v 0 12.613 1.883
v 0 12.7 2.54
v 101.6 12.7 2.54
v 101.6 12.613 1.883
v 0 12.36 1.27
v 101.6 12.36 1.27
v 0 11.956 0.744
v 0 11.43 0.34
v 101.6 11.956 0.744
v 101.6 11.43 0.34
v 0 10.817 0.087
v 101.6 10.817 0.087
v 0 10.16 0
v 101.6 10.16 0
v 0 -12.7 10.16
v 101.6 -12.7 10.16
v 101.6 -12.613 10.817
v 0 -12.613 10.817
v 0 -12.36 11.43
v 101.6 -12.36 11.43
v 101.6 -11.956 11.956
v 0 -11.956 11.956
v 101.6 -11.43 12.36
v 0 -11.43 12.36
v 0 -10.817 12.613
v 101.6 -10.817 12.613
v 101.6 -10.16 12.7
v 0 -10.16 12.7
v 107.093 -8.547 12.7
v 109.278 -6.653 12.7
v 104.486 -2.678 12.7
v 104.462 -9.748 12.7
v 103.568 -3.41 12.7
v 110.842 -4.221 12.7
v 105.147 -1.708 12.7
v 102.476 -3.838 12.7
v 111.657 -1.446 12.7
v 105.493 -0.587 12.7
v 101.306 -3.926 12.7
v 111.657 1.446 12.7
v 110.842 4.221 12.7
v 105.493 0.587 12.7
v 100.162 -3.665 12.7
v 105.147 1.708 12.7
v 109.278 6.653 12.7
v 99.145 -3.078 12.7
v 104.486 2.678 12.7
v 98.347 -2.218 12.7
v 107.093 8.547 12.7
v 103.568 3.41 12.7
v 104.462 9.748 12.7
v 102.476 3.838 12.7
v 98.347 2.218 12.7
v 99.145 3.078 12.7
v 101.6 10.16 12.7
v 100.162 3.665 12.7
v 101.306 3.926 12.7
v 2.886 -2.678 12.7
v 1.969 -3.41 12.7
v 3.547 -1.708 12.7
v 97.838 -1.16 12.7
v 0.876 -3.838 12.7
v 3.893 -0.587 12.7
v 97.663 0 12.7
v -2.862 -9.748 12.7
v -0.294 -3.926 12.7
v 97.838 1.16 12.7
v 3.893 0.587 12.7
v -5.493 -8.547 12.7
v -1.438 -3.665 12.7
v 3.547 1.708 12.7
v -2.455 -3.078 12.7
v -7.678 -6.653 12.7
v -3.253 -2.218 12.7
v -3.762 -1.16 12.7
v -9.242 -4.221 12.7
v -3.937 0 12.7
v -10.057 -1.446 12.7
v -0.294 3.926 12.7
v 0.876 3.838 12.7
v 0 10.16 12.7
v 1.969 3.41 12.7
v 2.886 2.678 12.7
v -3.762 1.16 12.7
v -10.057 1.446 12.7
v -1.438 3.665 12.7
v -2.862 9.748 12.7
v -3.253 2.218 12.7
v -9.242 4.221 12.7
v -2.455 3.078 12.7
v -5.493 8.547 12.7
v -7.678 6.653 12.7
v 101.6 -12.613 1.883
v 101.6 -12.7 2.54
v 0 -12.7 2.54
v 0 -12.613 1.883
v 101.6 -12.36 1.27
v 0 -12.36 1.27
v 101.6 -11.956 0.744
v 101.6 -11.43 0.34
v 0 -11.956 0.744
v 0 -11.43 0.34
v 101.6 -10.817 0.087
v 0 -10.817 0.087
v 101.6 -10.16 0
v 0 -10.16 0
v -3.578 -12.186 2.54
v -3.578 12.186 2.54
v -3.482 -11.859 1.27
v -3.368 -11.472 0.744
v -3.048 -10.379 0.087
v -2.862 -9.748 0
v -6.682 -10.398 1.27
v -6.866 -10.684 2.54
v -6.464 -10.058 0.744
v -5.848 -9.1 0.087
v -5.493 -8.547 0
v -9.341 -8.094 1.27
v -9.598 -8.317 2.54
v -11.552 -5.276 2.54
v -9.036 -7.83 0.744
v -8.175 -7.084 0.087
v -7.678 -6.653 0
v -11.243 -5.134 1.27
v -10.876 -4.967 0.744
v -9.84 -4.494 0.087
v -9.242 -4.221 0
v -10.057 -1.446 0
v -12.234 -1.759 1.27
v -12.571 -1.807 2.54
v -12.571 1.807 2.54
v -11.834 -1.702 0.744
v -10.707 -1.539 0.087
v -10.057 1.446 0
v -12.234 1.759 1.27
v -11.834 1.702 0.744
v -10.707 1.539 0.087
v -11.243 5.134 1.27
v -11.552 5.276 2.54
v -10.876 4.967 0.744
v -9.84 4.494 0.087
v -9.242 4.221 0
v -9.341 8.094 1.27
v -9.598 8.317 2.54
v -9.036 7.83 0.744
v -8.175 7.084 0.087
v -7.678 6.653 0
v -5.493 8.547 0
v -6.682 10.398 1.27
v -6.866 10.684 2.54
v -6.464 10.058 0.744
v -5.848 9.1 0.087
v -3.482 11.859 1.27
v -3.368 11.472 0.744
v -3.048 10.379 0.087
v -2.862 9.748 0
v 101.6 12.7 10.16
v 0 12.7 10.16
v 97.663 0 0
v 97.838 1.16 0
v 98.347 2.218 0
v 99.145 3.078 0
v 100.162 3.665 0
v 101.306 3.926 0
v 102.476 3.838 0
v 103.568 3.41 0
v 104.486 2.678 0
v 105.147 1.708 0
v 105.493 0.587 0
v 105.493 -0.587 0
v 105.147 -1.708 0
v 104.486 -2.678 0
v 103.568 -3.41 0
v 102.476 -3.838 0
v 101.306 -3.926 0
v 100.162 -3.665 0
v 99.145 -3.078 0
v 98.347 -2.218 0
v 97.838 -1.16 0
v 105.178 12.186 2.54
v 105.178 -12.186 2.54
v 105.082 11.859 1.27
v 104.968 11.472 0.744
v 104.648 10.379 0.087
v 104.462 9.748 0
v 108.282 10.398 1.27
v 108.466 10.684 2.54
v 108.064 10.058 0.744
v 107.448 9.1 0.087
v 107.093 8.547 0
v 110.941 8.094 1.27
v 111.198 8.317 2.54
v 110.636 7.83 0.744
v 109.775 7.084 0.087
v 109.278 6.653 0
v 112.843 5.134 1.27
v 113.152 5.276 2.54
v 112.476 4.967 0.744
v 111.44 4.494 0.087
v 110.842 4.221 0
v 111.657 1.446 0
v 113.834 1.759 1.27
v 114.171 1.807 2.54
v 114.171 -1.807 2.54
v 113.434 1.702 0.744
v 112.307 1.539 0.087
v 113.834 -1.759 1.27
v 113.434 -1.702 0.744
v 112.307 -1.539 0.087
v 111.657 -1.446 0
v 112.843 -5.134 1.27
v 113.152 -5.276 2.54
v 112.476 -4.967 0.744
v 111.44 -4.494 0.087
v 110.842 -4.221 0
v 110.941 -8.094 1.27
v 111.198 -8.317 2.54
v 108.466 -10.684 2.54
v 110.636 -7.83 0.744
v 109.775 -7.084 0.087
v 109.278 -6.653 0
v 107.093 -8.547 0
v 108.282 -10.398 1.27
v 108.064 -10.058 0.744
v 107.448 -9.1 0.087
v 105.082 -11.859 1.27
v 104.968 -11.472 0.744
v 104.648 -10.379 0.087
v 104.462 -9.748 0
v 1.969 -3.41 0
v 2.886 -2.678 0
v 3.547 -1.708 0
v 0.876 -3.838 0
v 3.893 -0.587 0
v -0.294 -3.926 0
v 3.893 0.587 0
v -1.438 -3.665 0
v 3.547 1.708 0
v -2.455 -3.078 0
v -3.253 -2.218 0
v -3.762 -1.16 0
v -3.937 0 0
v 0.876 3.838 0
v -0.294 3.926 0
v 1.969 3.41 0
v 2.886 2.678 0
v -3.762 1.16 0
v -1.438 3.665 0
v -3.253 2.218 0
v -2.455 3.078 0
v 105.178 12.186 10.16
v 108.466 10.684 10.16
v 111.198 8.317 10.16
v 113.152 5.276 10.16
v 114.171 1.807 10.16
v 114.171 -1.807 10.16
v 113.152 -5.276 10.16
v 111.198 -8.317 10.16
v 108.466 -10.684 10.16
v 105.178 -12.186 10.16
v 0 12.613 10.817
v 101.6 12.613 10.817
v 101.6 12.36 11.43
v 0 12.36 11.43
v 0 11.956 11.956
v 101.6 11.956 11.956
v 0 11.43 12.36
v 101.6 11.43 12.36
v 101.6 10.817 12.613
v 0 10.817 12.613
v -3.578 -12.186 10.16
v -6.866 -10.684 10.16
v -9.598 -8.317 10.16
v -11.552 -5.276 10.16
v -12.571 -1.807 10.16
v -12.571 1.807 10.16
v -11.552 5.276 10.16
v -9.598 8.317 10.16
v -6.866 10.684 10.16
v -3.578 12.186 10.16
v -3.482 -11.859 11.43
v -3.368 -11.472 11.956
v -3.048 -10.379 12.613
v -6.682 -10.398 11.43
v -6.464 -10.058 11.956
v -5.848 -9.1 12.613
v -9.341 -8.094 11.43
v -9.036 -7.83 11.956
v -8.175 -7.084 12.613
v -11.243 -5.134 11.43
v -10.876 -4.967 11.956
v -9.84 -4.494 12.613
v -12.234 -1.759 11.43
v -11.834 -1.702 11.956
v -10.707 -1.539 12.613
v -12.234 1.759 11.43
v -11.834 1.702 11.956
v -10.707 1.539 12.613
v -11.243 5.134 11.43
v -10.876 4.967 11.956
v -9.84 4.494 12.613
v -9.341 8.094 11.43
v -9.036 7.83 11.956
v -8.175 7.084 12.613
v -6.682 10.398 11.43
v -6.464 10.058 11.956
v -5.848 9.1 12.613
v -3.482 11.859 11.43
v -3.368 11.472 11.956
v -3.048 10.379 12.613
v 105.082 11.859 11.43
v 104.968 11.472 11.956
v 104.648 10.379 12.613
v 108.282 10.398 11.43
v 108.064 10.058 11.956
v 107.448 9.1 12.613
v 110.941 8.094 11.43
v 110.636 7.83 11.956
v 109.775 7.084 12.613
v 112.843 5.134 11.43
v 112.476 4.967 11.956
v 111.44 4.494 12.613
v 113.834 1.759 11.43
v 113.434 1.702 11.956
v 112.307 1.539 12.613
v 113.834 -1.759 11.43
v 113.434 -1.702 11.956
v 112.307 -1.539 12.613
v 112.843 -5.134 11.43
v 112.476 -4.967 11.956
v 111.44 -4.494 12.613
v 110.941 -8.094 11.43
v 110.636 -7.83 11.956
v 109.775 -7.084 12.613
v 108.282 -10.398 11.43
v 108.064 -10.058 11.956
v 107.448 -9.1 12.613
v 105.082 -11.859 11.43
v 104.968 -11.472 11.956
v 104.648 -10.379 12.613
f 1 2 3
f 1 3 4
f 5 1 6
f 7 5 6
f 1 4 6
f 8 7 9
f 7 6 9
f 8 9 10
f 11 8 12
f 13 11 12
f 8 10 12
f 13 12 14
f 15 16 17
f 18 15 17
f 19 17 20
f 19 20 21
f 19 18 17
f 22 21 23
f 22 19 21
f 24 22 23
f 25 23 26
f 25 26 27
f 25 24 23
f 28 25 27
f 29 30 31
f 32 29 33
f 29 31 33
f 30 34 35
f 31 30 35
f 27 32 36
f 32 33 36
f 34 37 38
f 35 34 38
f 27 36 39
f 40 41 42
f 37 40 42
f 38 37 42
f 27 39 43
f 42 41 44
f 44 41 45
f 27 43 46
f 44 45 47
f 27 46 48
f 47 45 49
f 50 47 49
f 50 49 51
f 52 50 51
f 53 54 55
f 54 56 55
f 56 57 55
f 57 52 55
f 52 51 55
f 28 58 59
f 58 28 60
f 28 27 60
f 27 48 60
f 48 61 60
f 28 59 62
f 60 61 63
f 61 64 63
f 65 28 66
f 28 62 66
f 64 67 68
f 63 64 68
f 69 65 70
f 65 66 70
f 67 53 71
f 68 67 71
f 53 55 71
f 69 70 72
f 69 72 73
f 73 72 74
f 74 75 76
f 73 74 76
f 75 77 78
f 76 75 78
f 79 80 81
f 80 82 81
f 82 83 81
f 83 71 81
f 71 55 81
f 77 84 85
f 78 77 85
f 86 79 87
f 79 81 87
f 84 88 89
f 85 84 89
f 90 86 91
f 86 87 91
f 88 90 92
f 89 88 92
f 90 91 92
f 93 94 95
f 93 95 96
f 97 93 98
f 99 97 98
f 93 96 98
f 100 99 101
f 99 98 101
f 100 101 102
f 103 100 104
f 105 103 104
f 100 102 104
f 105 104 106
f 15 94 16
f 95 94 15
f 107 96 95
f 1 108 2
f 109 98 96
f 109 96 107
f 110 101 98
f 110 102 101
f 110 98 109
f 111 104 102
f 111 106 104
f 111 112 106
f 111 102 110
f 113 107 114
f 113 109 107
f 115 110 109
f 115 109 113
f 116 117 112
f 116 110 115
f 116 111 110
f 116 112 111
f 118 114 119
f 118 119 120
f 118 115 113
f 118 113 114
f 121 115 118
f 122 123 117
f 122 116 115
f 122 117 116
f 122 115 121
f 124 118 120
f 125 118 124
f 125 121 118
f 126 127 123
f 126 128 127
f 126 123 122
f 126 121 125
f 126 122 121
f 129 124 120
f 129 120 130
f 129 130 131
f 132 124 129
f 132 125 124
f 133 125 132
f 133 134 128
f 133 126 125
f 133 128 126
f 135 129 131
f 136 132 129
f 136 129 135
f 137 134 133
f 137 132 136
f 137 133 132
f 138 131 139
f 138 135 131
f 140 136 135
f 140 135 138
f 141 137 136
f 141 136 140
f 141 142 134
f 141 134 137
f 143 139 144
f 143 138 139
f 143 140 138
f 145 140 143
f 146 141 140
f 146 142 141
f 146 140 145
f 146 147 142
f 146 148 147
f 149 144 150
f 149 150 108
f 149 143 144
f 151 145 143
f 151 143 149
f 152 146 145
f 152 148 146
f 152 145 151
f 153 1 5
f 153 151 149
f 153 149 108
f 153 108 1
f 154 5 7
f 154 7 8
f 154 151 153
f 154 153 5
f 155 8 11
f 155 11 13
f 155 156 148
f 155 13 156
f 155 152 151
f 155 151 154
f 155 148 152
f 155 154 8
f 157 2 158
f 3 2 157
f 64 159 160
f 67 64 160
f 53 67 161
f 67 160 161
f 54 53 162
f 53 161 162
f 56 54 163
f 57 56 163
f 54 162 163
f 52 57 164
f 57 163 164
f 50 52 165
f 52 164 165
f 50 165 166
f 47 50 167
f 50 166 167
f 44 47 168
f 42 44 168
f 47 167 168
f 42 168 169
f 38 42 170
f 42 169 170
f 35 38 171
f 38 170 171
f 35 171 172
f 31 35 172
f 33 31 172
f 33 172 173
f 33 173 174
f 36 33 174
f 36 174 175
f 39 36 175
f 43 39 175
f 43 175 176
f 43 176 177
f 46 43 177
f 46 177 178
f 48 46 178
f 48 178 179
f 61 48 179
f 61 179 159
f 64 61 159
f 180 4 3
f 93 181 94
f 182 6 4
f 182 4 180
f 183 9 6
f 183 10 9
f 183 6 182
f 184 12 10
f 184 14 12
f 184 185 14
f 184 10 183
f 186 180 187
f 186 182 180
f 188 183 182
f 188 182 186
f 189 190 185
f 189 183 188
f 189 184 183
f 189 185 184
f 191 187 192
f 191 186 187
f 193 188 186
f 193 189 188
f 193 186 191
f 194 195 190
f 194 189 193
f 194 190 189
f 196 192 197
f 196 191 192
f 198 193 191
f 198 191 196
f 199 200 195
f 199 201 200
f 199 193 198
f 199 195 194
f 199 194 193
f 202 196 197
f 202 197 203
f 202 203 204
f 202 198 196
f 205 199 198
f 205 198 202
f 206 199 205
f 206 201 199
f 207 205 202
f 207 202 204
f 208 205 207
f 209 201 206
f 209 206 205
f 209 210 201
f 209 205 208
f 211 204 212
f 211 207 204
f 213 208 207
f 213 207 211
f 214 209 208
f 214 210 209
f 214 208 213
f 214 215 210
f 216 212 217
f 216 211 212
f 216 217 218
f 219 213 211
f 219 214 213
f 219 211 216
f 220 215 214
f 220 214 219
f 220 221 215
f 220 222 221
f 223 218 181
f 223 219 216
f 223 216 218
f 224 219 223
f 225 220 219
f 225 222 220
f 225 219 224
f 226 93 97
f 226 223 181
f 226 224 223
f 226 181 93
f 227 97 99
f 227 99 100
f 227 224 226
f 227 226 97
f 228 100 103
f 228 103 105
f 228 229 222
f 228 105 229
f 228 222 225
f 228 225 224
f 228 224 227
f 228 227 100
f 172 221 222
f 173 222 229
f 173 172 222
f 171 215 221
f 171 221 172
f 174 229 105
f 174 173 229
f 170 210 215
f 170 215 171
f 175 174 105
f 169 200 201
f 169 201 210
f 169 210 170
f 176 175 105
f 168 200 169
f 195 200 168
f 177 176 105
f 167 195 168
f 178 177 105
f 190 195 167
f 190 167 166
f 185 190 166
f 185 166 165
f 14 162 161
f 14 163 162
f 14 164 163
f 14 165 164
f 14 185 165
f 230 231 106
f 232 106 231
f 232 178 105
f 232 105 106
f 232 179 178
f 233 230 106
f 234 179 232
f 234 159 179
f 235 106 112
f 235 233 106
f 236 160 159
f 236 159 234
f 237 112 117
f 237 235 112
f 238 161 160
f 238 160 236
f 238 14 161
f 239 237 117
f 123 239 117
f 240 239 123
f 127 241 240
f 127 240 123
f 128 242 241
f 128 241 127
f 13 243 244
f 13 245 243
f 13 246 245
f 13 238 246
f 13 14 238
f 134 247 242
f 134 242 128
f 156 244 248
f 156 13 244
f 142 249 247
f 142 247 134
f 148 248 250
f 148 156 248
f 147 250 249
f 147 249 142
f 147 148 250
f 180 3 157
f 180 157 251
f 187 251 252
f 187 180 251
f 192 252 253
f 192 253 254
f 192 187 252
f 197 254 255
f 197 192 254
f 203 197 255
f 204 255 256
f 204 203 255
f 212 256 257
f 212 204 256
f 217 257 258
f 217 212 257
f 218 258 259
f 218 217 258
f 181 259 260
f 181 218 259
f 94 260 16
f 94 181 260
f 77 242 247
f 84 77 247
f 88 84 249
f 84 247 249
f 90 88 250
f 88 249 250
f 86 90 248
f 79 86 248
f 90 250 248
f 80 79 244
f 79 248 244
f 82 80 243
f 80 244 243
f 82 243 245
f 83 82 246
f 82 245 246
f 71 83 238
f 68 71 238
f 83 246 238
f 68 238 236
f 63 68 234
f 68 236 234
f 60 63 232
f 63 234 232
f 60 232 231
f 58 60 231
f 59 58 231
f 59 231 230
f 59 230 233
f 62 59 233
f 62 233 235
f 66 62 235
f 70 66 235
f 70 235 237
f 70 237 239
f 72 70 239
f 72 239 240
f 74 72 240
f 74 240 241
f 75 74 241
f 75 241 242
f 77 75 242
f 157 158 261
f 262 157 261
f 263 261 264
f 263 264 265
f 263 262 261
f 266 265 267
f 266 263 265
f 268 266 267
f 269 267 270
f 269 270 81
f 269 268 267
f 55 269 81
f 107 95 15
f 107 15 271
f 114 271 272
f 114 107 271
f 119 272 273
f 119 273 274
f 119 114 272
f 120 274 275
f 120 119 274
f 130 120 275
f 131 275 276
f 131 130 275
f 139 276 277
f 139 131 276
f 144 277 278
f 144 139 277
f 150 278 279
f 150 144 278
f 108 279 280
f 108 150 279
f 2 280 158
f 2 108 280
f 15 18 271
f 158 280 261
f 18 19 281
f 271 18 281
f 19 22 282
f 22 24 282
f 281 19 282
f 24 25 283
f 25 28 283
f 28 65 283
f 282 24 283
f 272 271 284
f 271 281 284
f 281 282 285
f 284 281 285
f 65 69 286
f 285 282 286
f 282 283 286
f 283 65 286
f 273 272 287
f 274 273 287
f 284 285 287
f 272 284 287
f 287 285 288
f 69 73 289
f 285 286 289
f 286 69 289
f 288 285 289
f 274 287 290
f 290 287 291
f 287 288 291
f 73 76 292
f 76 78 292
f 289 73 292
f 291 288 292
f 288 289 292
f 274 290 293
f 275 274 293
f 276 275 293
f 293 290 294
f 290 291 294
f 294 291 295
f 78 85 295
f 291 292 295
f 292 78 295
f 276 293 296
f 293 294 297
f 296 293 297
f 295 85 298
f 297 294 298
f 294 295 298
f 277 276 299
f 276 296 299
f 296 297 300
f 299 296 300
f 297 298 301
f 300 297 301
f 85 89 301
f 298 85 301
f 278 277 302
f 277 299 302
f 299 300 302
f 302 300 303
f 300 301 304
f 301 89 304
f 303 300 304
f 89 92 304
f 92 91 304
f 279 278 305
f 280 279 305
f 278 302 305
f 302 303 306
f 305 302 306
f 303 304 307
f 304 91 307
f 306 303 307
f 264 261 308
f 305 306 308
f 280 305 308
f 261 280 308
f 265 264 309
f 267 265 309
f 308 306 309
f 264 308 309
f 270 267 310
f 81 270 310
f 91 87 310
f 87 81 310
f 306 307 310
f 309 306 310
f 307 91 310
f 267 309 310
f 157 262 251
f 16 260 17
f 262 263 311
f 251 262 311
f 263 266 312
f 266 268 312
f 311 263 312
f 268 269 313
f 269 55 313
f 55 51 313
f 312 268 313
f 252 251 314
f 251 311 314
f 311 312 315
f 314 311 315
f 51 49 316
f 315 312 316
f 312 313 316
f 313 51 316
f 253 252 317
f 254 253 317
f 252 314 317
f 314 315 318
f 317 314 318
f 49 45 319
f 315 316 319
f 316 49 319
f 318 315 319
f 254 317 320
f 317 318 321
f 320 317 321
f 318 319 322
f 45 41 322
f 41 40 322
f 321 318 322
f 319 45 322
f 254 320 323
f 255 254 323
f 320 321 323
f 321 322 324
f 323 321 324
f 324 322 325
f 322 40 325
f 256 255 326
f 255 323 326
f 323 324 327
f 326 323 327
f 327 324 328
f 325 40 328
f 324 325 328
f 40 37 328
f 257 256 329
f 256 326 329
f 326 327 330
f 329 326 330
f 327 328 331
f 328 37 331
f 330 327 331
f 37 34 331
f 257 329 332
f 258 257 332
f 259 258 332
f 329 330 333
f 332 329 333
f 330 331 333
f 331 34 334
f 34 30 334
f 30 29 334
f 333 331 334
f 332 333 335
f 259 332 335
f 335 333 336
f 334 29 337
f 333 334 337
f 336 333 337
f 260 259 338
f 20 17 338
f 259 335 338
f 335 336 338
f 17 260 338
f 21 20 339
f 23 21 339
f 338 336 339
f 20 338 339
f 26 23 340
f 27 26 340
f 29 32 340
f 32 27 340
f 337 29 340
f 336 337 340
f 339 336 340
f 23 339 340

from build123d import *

# Parameters (mm, degrees)
BOSS_EXTRUDE1_DEPTH            = 12.7
FILLET1_R                      = 2.54
F_97_0_31_DIAMETER_HOLE1_D     = 7.874
F_97_0_31_DIAMETER_HOLE1_DEPTH = 25.4
F_97_0_31_DIAMETER_HOLE1_TIP   = 2.365588257


with BuildPart() as part:
    # Sketch1 → Boss-Extrude1 (new body)
    with BuildSketch(Plane.XY):
        with BuildLine():
            Line((0, 12.7), (101.6, 12.7))
            ThreePointArc((101.6, 12.7), (114.3, 0), (101.6, -12.7))
            Line((101.6, -12.7), (0, -12.7))
            ThreePointArc((0, -12.7), (-12.7, 0), (0, 12.7))
        make_face()
    extrude(amount=BOSS_EXTRUDE1_DEPTH)

    # Fillet1
    fillet1_edges = [part.edges().sort_by_distance(p)[0] for p in [
        (114.3, 0, 12.7),
        (50.8, 12.7, 12.7),
        (-12.7, 0, 12.7),
        (50.8, 12.7, 0),
        (114.3, 0, 0),
        (50.8, -12.7, 0),
        (-12.7, 0, 0),
        (50.8, -12.7, 12.7),
    ]]
    fillet(fillet1_edges, radius=FILLET1_R)

    # #97 (0.31) Diameter Hole1
    with Locations(Plane.XY.offset(12.7)):
        with Locations((0, 0), (101.6, 0)):
            Hole(F_97_0_31_DIAMETER_HOLE1_D / 2, depth=F_97_0_31_DIAMETER_HOLE1_DEPTH)
            with Locations((0, 0, -(F_97_0_31_DIAMETER_HOLE1_DEPTH + F_97_0_31_DIAMETER_HOLE1_TIP / 2))):  # 118° drill point
                Cone(0, F_97_0_31_DIAMETER_HOLE1_D / 2, F_97_0_31_DIAMETER_HOLE1_TIP, mode=Mode.SUBTRACT)


solid = part.part
